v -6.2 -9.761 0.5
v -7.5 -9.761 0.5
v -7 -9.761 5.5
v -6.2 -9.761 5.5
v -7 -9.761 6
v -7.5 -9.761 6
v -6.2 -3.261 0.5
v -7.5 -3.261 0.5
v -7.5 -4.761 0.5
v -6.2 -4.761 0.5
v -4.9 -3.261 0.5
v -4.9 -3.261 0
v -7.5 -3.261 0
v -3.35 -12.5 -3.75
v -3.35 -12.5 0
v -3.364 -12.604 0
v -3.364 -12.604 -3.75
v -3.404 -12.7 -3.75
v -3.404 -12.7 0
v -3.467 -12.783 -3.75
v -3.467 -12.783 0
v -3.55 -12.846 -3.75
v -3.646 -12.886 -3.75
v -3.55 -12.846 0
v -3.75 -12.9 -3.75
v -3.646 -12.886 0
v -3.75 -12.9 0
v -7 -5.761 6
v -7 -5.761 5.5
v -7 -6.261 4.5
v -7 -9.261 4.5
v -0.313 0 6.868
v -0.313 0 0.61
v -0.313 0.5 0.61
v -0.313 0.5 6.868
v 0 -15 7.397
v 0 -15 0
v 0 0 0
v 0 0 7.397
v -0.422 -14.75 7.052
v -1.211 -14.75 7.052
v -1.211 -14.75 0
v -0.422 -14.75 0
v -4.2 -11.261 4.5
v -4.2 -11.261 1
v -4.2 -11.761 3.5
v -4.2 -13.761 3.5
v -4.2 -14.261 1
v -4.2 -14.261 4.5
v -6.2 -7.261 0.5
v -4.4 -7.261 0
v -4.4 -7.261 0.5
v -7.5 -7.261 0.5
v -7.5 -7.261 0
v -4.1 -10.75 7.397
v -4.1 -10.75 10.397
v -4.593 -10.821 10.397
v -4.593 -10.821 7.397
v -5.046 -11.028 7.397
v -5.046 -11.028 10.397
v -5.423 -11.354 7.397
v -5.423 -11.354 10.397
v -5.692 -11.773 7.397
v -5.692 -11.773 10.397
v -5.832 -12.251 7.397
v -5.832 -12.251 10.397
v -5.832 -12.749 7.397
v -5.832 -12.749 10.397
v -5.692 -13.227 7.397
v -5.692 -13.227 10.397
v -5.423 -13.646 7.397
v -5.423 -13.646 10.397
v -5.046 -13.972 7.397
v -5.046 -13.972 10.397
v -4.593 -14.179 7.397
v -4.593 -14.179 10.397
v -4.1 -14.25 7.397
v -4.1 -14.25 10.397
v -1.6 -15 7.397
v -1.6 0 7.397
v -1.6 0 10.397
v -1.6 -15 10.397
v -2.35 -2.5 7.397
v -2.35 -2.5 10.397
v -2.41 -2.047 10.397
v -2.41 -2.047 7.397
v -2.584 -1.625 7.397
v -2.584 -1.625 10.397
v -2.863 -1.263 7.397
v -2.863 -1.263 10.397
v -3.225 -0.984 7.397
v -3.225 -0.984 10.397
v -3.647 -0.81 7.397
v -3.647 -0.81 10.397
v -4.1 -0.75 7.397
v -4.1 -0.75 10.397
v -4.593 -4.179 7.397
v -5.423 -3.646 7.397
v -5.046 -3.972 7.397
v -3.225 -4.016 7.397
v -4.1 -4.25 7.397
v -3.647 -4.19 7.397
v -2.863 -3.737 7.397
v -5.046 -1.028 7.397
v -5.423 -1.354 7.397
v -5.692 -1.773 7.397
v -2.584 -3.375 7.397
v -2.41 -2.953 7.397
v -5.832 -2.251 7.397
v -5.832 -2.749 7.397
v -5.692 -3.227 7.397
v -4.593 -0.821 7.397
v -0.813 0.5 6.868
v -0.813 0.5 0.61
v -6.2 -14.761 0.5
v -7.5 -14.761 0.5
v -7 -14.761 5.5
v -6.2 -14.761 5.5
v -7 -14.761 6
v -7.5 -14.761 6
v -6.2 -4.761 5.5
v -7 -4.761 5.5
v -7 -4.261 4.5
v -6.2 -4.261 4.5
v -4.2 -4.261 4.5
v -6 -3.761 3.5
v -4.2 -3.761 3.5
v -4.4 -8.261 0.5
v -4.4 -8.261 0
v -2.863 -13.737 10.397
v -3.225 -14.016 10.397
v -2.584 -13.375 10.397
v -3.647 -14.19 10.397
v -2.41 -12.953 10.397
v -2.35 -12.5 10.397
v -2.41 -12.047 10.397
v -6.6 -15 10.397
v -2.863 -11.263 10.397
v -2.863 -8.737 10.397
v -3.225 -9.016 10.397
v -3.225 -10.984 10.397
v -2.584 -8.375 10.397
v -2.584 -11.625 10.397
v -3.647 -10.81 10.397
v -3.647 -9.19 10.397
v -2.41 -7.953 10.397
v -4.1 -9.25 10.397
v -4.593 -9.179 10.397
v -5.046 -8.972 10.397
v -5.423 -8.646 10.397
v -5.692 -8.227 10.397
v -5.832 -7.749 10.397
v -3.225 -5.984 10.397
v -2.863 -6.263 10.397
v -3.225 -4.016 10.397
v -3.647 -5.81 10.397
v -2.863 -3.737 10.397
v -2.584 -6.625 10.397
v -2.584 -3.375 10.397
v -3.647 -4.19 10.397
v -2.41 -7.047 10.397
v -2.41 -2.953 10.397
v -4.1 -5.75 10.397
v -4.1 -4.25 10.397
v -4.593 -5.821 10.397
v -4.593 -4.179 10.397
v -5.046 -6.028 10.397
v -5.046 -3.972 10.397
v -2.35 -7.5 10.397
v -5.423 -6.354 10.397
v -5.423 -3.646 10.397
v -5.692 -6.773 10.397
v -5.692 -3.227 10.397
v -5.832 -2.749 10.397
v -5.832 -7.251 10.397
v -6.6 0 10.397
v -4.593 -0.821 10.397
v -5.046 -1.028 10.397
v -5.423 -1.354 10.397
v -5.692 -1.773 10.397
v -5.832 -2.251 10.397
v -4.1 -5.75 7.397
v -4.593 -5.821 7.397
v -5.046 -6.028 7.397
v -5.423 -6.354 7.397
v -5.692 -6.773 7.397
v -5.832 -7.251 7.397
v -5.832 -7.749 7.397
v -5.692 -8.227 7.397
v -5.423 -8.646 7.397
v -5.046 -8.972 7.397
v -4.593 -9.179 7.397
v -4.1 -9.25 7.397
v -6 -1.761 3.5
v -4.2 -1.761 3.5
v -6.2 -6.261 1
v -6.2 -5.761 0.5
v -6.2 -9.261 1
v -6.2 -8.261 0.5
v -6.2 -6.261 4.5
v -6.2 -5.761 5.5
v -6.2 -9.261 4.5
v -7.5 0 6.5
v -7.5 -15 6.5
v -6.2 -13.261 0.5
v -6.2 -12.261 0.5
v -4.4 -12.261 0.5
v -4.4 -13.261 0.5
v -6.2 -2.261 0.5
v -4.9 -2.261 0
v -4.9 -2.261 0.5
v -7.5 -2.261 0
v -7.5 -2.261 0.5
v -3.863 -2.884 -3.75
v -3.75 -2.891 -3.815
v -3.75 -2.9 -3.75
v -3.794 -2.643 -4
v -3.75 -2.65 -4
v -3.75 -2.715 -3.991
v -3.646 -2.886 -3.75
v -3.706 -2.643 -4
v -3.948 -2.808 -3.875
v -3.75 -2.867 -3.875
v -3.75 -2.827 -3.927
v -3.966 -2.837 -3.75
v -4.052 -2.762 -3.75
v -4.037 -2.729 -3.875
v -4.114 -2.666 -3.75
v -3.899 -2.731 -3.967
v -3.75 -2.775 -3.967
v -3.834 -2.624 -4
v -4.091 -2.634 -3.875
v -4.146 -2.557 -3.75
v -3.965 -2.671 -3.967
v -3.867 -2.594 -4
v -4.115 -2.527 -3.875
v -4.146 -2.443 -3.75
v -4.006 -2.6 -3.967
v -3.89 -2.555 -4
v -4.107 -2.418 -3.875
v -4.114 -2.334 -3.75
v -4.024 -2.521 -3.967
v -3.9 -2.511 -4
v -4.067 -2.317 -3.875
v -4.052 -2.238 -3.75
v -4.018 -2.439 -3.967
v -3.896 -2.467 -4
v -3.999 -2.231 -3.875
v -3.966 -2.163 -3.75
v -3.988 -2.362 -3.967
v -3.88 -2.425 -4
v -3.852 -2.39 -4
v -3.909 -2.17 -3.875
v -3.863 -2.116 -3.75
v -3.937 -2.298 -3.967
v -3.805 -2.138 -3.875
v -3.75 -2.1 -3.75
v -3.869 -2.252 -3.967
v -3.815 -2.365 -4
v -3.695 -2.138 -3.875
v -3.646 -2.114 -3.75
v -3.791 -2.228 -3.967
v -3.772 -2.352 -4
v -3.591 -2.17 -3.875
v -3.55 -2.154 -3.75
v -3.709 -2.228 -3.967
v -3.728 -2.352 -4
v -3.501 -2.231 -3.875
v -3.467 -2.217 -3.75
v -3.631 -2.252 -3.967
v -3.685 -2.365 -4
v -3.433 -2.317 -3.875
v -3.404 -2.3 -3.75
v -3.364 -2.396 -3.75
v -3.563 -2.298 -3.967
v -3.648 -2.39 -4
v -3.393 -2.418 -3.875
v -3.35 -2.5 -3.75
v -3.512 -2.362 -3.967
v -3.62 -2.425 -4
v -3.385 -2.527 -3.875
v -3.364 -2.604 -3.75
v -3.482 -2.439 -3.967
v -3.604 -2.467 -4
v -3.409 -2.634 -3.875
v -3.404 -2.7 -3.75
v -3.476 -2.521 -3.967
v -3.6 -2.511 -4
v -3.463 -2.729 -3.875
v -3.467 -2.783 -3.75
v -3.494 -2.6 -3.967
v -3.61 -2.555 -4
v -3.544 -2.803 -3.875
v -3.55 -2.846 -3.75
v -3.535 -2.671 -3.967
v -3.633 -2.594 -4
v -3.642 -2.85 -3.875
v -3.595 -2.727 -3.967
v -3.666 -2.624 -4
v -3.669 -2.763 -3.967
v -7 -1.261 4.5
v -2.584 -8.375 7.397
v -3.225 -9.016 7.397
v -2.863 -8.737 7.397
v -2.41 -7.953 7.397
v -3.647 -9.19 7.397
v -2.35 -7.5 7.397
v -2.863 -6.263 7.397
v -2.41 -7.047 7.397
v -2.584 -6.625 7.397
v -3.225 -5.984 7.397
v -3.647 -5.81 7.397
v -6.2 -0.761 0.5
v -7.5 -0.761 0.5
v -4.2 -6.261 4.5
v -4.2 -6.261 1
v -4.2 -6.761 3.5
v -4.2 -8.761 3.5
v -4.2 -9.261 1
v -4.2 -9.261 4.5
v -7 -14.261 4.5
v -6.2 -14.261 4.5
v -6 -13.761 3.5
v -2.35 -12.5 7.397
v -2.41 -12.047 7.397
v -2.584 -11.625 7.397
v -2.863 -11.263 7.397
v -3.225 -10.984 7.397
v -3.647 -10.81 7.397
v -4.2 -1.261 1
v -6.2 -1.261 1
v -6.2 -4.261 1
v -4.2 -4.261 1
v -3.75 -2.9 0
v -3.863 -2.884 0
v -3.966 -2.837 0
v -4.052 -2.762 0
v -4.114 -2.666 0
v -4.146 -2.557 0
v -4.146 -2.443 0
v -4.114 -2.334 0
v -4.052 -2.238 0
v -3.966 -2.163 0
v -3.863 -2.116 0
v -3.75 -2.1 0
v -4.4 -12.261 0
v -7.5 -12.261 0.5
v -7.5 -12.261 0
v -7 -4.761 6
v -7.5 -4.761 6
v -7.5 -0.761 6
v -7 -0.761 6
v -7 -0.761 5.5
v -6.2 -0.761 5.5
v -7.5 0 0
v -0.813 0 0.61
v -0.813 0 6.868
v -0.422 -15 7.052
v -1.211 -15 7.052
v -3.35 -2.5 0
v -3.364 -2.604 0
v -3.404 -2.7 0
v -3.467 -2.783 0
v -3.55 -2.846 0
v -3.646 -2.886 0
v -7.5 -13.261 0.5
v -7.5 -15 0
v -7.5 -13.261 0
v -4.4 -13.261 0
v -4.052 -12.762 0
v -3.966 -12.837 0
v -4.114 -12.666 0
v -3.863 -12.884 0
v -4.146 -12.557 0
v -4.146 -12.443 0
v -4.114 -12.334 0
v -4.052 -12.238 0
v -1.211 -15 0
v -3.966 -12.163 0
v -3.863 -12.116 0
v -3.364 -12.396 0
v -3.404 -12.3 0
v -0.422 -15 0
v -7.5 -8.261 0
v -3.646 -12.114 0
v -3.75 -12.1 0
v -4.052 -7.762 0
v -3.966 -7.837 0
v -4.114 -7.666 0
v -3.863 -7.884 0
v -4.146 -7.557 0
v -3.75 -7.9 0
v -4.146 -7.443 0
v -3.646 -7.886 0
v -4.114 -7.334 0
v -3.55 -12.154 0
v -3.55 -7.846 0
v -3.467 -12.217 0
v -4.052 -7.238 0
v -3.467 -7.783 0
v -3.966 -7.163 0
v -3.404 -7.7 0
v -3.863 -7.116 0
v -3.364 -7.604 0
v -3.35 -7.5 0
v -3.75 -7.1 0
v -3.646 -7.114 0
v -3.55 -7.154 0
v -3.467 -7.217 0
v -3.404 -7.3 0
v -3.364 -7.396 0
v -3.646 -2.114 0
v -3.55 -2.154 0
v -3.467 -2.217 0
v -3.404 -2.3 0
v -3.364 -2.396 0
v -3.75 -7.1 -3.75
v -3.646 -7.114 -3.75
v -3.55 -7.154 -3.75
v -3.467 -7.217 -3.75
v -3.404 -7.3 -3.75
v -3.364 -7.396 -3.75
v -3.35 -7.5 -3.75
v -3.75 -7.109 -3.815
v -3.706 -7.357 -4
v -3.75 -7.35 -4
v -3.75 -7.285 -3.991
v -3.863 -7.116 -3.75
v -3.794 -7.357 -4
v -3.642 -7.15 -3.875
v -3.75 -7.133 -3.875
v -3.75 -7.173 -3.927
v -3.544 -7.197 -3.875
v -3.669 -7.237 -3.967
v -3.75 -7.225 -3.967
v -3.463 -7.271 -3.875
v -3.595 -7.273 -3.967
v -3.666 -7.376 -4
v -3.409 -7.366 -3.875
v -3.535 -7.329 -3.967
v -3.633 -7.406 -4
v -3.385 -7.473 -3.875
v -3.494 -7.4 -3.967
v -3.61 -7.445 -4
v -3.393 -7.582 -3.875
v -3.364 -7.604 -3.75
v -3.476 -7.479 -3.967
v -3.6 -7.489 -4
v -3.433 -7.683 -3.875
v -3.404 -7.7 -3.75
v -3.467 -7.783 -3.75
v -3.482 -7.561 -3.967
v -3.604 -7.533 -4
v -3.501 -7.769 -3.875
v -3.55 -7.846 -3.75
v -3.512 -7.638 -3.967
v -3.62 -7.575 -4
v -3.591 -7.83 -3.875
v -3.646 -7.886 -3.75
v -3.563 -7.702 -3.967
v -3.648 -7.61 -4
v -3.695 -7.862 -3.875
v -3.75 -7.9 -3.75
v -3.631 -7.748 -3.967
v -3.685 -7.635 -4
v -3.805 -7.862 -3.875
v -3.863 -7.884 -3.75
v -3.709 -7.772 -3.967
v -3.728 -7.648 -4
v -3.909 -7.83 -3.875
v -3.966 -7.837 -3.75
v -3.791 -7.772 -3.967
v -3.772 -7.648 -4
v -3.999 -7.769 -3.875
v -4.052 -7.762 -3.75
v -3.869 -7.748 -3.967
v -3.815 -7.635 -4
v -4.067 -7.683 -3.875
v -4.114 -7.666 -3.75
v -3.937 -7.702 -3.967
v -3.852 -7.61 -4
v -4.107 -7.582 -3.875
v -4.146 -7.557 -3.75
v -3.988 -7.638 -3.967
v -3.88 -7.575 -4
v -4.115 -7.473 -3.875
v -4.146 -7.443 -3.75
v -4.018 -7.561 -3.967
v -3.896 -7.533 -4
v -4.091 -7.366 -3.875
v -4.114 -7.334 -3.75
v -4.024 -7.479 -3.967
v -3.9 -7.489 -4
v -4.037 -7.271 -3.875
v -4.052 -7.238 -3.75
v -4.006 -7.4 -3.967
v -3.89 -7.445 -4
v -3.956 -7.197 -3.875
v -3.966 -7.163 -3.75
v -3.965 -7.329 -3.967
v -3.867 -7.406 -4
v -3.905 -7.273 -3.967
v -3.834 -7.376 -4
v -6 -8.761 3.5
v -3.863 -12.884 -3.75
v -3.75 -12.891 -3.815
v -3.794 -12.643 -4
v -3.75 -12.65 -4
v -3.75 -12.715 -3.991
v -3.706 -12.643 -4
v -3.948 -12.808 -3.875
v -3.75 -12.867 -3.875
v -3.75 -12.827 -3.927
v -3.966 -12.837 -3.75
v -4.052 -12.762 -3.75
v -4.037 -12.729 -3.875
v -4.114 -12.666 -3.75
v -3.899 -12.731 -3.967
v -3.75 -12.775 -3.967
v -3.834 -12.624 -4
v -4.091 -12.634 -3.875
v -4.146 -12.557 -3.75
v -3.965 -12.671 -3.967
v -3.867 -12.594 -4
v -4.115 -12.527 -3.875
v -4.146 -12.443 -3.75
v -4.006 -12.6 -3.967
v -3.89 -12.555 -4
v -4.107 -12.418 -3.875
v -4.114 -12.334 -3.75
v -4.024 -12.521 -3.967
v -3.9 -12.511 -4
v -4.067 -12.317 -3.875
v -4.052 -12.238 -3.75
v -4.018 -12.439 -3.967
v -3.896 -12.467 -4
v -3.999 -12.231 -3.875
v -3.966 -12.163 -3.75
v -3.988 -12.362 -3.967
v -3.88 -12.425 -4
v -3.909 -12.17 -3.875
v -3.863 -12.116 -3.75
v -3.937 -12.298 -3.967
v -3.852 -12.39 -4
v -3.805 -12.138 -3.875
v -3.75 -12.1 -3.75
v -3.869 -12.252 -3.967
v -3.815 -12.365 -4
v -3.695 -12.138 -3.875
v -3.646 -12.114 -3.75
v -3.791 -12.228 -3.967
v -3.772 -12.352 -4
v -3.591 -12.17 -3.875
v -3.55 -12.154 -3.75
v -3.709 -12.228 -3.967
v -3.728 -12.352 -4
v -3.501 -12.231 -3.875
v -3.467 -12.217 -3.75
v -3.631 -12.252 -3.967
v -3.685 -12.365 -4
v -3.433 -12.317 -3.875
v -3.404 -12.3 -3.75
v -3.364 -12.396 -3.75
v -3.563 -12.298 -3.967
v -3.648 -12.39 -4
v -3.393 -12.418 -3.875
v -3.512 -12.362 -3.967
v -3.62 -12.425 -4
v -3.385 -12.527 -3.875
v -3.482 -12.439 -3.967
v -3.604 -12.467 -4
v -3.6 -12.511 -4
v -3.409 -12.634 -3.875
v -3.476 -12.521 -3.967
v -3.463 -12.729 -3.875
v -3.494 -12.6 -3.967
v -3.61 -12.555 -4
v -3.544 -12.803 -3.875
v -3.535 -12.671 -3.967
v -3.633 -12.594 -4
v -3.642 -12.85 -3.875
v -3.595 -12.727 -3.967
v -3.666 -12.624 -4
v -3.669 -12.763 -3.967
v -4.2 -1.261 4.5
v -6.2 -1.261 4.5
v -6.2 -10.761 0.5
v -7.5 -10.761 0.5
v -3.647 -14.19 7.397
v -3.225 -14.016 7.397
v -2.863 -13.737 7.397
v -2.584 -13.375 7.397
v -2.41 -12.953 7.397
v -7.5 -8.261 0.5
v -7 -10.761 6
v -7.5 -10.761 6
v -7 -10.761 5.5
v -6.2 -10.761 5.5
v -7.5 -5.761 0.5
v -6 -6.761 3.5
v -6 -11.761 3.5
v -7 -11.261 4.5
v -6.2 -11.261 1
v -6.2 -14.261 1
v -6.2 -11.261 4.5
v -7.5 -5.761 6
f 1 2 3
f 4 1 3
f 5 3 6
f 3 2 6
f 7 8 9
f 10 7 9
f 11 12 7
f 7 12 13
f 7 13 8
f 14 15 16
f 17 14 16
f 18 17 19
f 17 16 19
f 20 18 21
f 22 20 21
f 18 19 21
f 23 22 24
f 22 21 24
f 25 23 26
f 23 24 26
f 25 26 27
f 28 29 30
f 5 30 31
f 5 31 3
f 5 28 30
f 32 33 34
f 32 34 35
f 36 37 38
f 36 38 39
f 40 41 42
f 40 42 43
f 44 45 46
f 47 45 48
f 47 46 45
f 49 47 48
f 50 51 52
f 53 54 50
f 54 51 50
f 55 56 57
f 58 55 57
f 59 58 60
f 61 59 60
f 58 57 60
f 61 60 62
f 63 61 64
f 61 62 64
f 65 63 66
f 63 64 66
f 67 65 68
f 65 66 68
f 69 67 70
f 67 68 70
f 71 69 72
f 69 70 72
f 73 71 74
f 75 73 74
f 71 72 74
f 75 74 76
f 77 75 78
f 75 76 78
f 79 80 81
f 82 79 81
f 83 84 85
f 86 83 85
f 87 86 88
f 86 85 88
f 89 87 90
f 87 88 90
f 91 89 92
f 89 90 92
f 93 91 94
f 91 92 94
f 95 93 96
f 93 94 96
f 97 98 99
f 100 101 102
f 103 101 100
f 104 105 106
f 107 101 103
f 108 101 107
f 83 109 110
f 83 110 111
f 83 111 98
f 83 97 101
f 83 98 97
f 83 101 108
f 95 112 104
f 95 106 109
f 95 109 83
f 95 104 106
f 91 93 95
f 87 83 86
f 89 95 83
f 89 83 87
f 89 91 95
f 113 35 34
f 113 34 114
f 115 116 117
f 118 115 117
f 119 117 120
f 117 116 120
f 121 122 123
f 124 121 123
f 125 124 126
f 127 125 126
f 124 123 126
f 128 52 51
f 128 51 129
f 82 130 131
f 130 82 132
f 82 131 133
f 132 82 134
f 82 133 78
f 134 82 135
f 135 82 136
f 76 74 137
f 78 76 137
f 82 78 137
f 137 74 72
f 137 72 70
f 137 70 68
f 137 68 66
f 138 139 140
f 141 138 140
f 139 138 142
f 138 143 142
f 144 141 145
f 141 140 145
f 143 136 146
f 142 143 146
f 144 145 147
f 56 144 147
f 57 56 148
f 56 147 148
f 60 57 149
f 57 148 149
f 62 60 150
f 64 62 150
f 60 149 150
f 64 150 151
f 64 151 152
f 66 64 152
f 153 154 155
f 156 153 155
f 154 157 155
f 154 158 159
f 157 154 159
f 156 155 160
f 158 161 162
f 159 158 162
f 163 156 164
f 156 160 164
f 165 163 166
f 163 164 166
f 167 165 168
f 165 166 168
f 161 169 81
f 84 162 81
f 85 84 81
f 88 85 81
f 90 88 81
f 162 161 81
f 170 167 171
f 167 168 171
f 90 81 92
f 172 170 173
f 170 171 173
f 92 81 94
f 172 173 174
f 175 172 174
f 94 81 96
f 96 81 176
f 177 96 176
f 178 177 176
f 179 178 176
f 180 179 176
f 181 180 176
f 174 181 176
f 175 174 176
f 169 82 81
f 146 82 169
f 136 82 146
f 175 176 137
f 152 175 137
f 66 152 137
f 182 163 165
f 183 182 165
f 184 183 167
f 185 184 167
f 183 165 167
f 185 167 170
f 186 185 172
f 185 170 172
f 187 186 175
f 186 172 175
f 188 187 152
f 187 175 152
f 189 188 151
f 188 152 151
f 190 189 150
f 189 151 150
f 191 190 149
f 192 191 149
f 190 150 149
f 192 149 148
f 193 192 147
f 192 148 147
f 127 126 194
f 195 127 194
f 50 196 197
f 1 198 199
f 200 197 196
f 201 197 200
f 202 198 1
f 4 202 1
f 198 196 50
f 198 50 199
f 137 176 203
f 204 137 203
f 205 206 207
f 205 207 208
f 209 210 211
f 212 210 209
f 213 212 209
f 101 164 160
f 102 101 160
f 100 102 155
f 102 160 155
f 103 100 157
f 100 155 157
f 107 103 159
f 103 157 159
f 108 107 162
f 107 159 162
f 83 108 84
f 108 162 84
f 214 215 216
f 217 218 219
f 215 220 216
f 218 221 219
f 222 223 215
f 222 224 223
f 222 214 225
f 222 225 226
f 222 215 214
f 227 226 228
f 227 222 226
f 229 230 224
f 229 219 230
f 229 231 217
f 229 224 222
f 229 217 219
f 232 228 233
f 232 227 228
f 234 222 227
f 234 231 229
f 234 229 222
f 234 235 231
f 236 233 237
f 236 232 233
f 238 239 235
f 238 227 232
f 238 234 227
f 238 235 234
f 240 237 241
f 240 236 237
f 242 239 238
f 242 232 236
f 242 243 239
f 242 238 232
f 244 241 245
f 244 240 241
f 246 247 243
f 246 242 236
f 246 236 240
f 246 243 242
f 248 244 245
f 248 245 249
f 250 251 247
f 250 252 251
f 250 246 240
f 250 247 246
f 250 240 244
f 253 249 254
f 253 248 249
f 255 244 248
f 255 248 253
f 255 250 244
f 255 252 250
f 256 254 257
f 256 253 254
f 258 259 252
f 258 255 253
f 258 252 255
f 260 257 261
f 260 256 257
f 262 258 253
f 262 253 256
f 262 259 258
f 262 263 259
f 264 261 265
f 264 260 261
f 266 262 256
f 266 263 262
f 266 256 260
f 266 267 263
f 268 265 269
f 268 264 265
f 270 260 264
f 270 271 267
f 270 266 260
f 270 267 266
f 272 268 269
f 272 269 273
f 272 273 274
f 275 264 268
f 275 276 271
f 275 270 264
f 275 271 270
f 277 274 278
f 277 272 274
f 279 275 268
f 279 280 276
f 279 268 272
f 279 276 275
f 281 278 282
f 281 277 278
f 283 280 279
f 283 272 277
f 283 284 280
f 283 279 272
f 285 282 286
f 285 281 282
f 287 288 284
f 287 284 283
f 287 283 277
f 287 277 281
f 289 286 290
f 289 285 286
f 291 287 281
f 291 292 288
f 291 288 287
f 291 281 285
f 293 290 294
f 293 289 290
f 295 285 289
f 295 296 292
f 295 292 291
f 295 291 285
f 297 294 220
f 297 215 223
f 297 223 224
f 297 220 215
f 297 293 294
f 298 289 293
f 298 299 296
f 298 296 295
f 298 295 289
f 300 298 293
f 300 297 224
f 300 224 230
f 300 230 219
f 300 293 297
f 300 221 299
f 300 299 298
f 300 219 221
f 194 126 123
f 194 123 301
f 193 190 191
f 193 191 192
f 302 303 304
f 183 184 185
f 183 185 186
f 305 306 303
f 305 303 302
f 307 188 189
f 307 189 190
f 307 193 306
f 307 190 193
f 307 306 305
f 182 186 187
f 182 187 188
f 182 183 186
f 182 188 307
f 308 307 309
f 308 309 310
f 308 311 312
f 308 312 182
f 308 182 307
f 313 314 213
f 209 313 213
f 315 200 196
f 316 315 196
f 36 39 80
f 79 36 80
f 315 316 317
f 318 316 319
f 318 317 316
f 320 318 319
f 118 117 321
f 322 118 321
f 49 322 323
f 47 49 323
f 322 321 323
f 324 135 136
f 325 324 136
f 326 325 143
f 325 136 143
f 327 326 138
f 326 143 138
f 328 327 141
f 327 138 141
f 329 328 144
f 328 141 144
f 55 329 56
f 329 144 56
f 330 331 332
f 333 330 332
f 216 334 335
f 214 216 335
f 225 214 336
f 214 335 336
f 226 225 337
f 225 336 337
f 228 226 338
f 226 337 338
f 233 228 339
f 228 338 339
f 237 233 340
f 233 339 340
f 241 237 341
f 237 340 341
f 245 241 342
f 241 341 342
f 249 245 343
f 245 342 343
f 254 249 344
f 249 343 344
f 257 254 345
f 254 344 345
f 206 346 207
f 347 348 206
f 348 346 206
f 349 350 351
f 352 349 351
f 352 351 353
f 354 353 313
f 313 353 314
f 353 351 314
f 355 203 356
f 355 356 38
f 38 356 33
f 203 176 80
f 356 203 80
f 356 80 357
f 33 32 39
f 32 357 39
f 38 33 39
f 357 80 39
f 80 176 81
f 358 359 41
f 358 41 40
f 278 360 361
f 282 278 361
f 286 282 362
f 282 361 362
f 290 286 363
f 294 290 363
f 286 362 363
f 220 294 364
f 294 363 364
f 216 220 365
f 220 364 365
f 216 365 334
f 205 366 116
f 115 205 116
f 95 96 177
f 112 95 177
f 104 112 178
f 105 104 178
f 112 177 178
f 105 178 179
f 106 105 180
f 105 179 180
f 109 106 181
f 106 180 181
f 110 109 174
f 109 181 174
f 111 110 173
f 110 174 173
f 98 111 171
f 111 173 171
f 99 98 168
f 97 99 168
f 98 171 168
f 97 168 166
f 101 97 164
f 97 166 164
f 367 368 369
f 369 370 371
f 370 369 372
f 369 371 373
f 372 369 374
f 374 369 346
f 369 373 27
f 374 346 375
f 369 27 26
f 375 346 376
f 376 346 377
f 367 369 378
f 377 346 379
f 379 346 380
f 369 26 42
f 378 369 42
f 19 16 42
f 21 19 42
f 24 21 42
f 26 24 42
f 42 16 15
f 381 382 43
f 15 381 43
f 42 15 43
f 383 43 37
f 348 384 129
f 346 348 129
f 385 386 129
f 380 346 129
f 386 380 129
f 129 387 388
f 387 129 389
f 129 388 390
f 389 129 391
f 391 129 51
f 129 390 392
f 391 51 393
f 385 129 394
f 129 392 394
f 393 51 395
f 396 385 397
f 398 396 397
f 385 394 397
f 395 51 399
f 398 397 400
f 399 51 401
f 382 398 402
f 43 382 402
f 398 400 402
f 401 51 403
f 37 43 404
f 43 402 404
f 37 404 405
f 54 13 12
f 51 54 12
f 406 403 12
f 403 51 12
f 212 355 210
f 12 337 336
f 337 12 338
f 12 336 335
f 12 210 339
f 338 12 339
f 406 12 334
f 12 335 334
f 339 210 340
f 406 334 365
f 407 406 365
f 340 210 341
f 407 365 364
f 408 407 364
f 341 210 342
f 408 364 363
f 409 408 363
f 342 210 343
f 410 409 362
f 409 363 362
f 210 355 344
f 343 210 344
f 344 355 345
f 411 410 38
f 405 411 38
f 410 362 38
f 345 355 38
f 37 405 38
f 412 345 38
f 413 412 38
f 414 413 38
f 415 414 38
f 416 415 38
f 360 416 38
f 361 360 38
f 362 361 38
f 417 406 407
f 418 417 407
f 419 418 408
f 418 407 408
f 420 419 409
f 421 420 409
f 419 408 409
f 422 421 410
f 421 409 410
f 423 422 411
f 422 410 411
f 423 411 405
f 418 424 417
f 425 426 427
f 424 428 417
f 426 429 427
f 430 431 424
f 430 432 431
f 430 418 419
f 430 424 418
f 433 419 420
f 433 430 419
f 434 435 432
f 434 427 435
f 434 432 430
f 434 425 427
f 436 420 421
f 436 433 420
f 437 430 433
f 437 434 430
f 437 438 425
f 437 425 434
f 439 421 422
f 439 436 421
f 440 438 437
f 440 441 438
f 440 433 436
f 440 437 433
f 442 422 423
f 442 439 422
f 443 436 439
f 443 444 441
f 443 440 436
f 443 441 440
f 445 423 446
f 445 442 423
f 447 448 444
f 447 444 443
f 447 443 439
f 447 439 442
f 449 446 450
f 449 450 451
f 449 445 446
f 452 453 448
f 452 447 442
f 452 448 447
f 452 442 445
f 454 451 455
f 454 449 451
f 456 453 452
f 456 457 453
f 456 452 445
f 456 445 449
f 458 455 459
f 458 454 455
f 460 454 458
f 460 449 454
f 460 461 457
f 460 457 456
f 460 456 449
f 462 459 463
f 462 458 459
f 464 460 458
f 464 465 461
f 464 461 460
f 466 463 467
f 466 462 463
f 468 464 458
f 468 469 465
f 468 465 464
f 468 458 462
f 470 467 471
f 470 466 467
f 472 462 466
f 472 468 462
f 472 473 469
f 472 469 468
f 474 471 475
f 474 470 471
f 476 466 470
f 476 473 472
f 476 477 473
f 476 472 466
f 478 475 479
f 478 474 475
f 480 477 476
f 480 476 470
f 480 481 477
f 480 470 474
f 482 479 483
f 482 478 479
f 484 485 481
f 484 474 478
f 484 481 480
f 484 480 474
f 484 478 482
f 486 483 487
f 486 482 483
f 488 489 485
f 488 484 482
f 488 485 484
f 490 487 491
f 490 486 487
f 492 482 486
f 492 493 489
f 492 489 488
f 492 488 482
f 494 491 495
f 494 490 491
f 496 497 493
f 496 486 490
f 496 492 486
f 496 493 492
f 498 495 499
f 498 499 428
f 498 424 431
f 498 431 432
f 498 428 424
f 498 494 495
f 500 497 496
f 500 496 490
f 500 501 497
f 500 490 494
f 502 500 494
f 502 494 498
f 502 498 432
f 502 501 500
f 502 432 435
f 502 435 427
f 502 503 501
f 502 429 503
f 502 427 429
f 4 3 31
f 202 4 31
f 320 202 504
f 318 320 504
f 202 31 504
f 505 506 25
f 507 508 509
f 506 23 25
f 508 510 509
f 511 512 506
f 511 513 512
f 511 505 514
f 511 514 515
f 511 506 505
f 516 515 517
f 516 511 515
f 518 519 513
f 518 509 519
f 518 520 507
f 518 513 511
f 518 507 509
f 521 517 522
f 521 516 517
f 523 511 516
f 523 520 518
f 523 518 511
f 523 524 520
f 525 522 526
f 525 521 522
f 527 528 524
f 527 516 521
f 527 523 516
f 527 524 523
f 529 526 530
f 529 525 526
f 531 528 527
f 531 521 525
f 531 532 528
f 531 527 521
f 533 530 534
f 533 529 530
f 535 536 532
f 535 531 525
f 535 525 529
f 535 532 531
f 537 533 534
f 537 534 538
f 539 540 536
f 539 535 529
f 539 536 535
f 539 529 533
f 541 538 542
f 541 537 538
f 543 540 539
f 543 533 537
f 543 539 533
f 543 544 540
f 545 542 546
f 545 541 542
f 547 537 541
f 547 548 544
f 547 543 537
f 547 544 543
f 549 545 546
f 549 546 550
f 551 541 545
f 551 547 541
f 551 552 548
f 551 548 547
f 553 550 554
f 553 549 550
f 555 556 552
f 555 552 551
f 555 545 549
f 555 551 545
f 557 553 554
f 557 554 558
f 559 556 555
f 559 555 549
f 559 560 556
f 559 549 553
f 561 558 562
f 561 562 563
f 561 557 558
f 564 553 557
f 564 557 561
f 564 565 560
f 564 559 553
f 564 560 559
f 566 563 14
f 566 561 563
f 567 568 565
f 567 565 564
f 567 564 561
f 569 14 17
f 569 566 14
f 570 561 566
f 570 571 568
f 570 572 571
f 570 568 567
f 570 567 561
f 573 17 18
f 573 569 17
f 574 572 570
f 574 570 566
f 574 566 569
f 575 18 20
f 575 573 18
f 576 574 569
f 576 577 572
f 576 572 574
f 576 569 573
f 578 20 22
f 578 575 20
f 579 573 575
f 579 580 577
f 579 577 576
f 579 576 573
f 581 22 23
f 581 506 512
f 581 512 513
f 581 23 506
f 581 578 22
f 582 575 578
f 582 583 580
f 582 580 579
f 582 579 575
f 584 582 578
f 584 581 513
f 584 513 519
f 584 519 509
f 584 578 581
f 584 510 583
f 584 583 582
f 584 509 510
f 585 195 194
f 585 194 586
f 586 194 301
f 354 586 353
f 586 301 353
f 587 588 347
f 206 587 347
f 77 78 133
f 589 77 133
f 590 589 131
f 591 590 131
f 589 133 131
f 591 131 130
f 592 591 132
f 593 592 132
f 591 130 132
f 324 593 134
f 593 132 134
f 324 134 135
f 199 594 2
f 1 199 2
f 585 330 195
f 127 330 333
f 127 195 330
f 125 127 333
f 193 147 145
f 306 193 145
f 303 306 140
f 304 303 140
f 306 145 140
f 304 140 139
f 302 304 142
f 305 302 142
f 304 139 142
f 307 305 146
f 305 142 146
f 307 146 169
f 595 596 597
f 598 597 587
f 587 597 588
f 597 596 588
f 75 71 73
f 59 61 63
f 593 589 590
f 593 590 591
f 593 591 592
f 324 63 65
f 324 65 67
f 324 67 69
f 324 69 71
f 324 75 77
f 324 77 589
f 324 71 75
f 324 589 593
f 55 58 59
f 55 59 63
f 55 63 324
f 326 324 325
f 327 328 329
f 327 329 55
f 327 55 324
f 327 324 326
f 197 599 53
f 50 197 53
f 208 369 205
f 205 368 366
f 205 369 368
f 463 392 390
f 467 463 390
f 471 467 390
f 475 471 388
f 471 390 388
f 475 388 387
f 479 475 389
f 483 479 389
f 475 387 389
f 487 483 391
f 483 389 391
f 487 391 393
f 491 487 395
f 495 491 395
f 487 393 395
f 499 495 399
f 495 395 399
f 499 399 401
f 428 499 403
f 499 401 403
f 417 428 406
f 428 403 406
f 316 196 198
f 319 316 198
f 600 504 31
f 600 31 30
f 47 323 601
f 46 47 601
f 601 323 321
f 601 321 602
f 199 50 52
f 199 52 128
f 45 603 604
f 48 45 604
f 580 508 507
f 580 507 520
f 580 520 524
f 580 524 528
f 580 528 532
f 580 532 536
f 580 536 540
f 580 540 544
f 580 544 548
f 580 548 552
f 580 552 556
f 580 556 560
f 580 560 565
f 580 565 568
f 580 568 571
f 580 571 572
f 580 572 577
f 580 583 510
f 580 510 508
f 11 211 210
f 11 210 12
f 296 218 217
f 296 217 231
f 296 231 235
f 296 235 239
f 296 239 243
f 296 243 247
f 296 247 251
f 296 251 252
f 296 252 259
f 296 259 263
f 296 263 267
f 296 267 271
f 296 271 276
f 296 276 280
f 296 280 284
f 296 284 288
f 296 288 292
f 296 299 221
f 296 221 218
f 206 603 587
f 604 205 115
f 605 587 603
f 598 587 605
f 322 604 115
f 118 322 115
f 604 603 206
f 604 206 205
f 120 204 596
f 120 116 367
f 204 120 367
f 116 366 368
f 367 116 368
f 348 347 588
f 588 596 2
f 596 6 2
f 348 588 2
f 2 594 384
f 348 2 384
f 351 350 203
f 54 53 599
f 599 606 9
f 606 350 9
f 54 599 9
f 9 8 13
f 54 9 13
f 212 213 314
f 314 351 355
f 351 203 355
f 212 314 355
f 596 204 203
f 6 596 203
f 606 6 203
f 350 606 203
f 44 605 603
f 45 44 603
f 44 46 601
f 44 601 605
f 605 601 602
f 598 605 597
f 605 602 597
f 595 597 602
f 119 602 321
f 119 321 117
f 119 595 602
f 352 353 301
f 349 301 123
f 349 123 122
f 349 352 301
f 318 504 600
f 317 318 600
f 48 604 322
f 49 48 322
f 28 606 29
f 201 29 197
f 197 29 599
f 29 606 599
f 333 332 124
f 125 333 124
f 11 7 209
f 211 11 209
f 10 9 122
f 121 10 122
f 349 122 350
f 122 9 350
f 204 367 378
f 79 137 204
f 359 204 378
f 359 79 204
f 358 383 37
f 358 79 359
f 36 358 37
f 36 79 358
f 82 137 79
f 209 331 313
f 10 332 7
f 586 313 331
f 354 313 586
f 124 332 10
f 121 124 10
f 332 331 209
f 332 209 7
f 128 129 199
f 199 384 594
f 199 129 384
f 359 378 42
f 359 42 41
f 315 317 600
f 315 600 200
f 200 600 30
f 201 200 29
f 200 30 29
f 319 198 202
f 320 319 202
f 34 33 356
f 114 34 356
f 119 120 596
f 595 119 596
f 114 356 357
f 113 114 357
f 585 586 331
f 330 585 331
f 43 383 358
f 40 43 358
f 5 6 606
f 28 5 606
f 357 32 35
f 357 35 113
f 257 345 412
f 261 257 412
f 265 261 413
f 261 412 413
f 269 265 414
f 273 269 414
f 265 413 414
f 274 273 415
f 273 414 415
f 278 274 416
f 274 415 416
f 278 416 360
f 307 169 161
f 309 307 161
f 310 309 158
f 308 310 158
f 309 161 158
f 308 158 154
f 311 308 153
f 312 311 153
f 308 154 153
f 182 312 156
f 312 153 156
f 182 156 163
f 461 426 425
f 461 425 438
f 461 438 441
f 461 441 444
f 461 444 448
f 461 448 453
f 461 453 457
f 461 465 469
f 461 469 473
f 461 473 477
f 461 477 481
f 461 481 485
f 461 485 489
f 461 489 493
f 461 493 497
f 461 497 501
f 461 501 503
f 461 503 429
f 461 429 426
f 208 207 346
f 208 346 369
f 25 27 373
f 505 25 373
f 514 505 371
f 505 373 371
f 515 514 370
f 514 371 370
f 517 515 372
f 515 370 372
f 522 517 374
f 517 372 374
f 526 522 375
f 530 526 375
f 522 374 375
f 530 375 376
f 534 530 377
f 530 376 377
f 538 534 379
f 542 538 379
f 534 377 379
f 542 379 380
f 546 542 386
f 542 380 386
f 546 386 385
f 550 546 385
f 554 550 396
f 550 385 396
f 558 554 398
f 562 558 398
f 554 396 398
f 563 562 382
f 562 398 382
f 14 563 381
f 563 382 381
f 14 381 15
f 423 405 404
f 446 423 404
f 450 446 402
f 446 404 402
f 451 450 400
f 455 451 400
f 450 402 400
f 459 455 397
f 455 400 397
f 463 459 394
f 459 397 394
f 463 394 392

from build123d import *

# Parameters (mm, degrees)
F1_DEPTH  = 15
F3_DEPTH  = 3
F4_W      = 0.5
F4_H      = 0.5
F5_DEPTH  = 0.5
F6_DEPTH  = 1.3
F7_DEPTH  = 3.3
F8_SIZE   = 1
F9_W      = 0.7894294686
F9_H      = 7.0516658016
F10_DEPTH = 0.25
F11_W     = 0.5
F11_H     = 6.2580032973
F12_DEPTH = 0.5
F14_DEPTH = 4
F6_FACE_W = 1
F6_FACE_H = 0.5
F16_DEPTH = 2.6


# Not quite as in the source:
# - a fillet or chamfer that OpenCascade refuses, or shapes differently, is made with other operations: its cross-section is extruded or revolved along the edge and cut away or added


with BuildPart() as f1:
    # F0 (on Front) → F1 (new body)
    with BuildSketch(Plane.XZ):
        Polygon((-7.5, 0), (0, 0), (0, 7.397435054), (-1.6, 7.397435054), (-1.6, 10.397435054), (-6.6, 10.397435054), (-7.5, 6.5), align=None)
    extrude(amount=F1_DEPTH)

    # F2 (on face) → F3 (cut)
    with BuildSketch(Plane.XY.offset(10.397435054)):
        with BuildLine():
            ThreePointArc((-2.35, -2.5), (-2.8625631329, -1.2625631329), (-4.1, -0.75))
            Line((-4.1, -0.75), (-4.1, -2.5))
            Line((-4.1, -2.5), (-4.1, -4.25))
            ThreePointArc((-4.1, -4.25), (-2.8625631329, -3.7374368671), (-2.35, -2.5))
        make_face()
        with BuildLine():
            ThreePointArc((-2.35, -12.5), (-2.8625631329, -11.2625631329), (-4.1, -10.75))
            Line((-4.1, -10.75), (-4.1, -14.25))
            ThreePointArc((-4.1, -14.25), (-2.8625631329, -13.7374368671), (-2.35, -12.5))
        make_face()
        with BuildLine():
            Line((-4.1, -14.25), (-4.1, -10.75))
            ThreePointArc((-4.1, -10.75), (-5.85, -12.5), (-4.1, -14.25))
        make_face()
        with BuildLine():
            ThreePointArc((-2.35, -7.5), (-2.8625631329, -6.2625631329), (-4.1, -5.75))
            Line((-4.1, -5.75), (-4.1, -7.5))
            Line((-4.1, -7.5), (-2.35, -7.5))
        make_face()
        with BuildLine():
            Line((-4.1, -7.5), (-4.1, -5.75))
            ThreePointArc((-4.1, -5.75), (-5.85, -7.5), (-4.1, -9.25))
            Line((-4.1, -9.25), (-4.1, -7.5))
        make_face()
        with BuildLine():
            Line((-4.1, -2.5), (-4.1, -0.75))
            ThreePointArc((-4.1, -0.75), (-5.85, -2.5), (-4.1, -4.25))
            Line((-4.1, -4.25), (-4.1, -2.5))
        make_face()
        with BuildLine():
            Line((-2.35, -7.5), (-4.1, -7.5))
            Line((-4.1, -7.5), (-4.1, -9.25))
            ThreePointArc((-4.1, -9.25), (-2.8625631329, -8.7374368671), (-2.35, -7.5))
        make_face()
    extrude(amount=-F3_DEPTH, mode=Mode.SUBTRACT)

    # F4 (on face) → F5 (cut)
    with BuildSketch(Plane(origin=(-7.5, 0, 0), x_dir=(0, -1, 0), z_dir=(-1, 0, 0))):
        with Locations((2.510879118, 0.25)):
            Rectangle(F4_W, F4_H)
        with Locations((12.510879118, 0.25)):
            Rectangle(F4_W, F4_H)
        with Locations((7.510879118, 0.25)):
            Rectangle(F4_W, F4_H)
        with Locations((3.010879118, 0.25)):
            Rectangle(F4_W, F4_H)
        Polygon((0.760879118, 0.5), (2.260879118, 0.5), (2.760879118, 0.5), (2.760879118, 1), (1.260879118, 1), (1.260879118, 4.5), (0.760879118, 5.5), align=None)
        Polygon((2.760879118, 1), (2.760879118, 0.5), (3.260879118, 0.5), (4.760879118, 0.5), (4.760879118, 5.5), (4.260879118, 4.5), (4.260879118, 1), align=None)
        Polygon((0.760879118, 6), (0.760879118, 5.5), (1.260879118, 4.5), (1.760879118, 3.5), (2.760879118, 3.5), (2.760879118, 5.5), (2.760879118, 6), align=None)
        with Locations((8.010879118, 0.25)):
            Rectangle(F4_W, F4_H)
        Polygon((5.760879118, 0.5), (7.260879118, 0.5), (7.760879118, 0.5), (7.760879118, 1), (6.260879118, 1), (6.260879118, 4.5), (5.760879118, 5.5), align=None)
        Polygon((2.760879118, 5.5), (2.760879118, 3.5), (3.760879118, 3.5), (4.260879118, 4.5), (4.760879118, 5.5), (4.760879118, 6), (2.760879118, 6), align=None)
        Polygon((7.760879118, 1), (7.760879118, 0.5), (8.260879118, 0.5), (9.760879118, 0.5), (9.760879118, 5.5), (9.260879118, 4.5), (9.260879118, 1), align=None)
        Polygon((5.760879118, 6), (5.760879118, 5.5), (6.260879118, 4.5), (6.760879118, 3.5), (7.760879118, 3.5), (7.760879118, 5.5), (7.760879118, 6), align=None)
        with Locations((13.010879118, 0.25)):
            Rectangle(F4_W, F4_H)
        Polygon((10.760879118, 0.5), (12.260879118, 0.5), (12.760879118, 0.5), (12.760879118, 1), (11.260879118, 1), (11.260879118, 4.5), (10.760879118, 5.5), align=None)
        Polygon((7.760879118, 5.5), (7.760879118, 3.5), (8.760879118, 3.5), (9.260879118, 4.5), (9.760879118, 5.5), (9.760879118, 6), (7.760879118, 6), align=None)
        Polygon((12.760879118, 1), (12.760879118, 0.5), (13.260879118, 0.5), (14.760879118, 0.5), (14.760879118, 5.5), (14.260879118, 4.5), (14.260879118, 1), align=None)
        Polygon((10.760879118, 6), (10.760879118, 5.5), (11.260879118, 4.5), (11.760879118, 3.5), (12.760879118, 3.5), (12.760879118, 5.5), (12.760879118, 6), align=None)
        Polygon((12.760879118, 5.5), (12.760879118, 3.5), (13.760879118, 3.5), (14.260879118, 4.5), (14.760879118, 5.5), (14.760879118, 6), (12.760879118, 6), align=None)
        Polygon((1.260879118, 1), (2.760879118, 1), (2.760879118, 3.5), (1.760879118, 3.5), (1.260879118, 4.5), align=None)
        Polygon((2.760879118, 3.5), (2.760879118, 1), (4.260879118, 1), (4.260879118, 4.5), (3.760879118, 3.5), align=None)
        Polygon((6.260879118, 1), (7.760879118, 1), (7.760879118, 3.5), (6.760879118, 3.5), (6.260879118, 4.5), align=None)
        Polygon((7.760879118, 3.5), (7.760879118, 1), (9.260879118, 1), (9.260879118, 4.5), (8.760879118, 3.5), align=None)
        Polygon((11.260879118, 1), (12.760879118, 1), (12.760879118, 3.5), (11.760879118, 3.5), (11.260879118, 4.5), align=None)
        Polygon((12.760879118, 3.5), (12.760879118, 1), (14.260879118, 1), (14.260879118, 4.5), (13.760879118, 3.5), align=None)
    extrude(amount=-F5_DEPTH, mode=Mode.SUBTRACT)

    # F4 (on face) → F6 (cut)
    with BuildSketch(Plane(origin=(-7.5, 0, 0), x_dir=(0, -1, 0), z_dir=(-1, 0, 0))):
        Polygon((0.760879118, 0.5), (2.260879118, 0.5), (2.760879118, 0.5), (2.760879118, 1), (1.260879118, 1), (1.260879118, 4.5), (0.760879118, 5.5), align=None)
        Polygon((1.260879118, 1), (2.760879118, 1), (2.760879118, 3.5), (1.760879118, 3.5), (1.260879118, 4.5), align=None)
        Polygon((2.760879118, 3.5), (2.760879118, 1), (4.260879118, 1), (4.260879118, 4.5), (3.760879118, 3.5), align=None)
        Polygon((2.760879118, 1), (2.760879118, 0.5), (3.260879118, 0.5), (4.760879118, 0.5), (4.760879118, 5.5), (4.260879118, 4.5), (4.260879118, 1), align=None)
        Polygon((5.760879118, 0.5), (7.260879118, 0.5), (7.760879118, 0.5), (7.760879118, 1), (6.260879118, 1), (6.260879118, 4.5), (5.760879118, 5.5), align=None)
        Polygon((6.260879118, 1), (7.760879118, 1), (7.760879118, 3.5), (6.760879118, 3.5), (6.260879118, 4.5), align=None)
        Polygon((7.760879118, 3.5), (7.760879118, 1), (9.260879118, 1), (9.260879118, 4.5), (8.760879118, 3.5), align=None)
        Polygon((7.760879118, 1), (7.760879118, 0.5), (8.260879118, 0.5), (9.760879118, 0.5), (9.760879118, 5.5), (9.260879118, 4.5), (9.260879118, 1), align=None)
        Polygon((12.260879118, 0.5), (12.760879118, 0.5), (12.760879118, 1), (11.260879118, 1), (11.260879118, 4.5), (10.760879118, 5.5), (10.760879118, 0.5), align=None)
        Polygon((11.260879118, 1), (12.760879118, 1), (12.760879118, 3.5), (11.760879118, 3.5), (11.260879118, 4.5), align=None)
        Polygon((12.760879118, 3.5), (12.760879118, 1), (14.260879118, 1), (14.260879118, 4.5), (13.760879118, 3.5), align=None)
        Polygon((12.760879118, 0.5), (13.260879118, 0.5), (14.760879118, 0.5), (14.760879118, 5.5), (14.260879118, 4.5), (14.260879118, 1), (12.760879118, 1), align=None)
    extrude(amount=-F6_DEPTH, mode=Mode.SUBTRACT)

    # F4 (on face) → F7 (cut)
    with BuildSketch(Plane(origin=(-7.5, 0, 0), x_dir=(0, -1, 0), z_dir=(-1, 0, 0))):
        Polygon((1.260879118, 1), (2.760879118, 1), (2.760879118, 3.5), (1.760879118, 3.5), (1.260879118, 4.5), align=None)
        Polygon((2.760879118, 3.5), (2.760879118, 1), (4.260879118, 1), (4.260879118, 4.5), (3.760879118, 3.5), align=None)
        Polygon((6.260879118, 1), (7.760879118, 1), (7.760879118, 3.5), (6.760879118, 3.5), (6.260879118, 4.5), align=None)
        Polygon((7.760879118, 3.5), (7.760879118, 1), (9.260879118, 1), (9.260879118, 4.5), (8.760879118, 3.5), align=None)
        Polygon((11.260879118, 1), (12.760879118, 1), (12.760879118, 3.5), (11.760879118, 3.5), (11.260879118, 4.5), align=None)
        Polygon((12.760879118, 3.5), (12.760879118, 1), (14.260879118, 1), (14.260879118, 4.5), (13.760879118, 3.5), align=None)
    extrude(amount=-F7_DEPTH, mode=Mode.SUBTRACT)

    # F8
    f8_edges = [f1.edges().sort_by_distance(p)[0] for p in [
        (-7, -2.760879, 3.5),
        (-7, -7.760879, 3.5),
        (-7, -12.760879, 3.5),
    ]]
    chamfer(f8_edges, length=F8_SIZE)

    # F9 (on face) → F10 (cut)
    with BuildSketch(Plane.XZ.offset(15)):
        with Locations((-0.816616026, 3.5258329008)):
            Rectangle(F9_W, F9_H)
    extrude(amount=-F10_DEPTH, mode=Mode.SUBTRACT)

    # F11 (on face) → F12 (join)
    with BuildSketch(Plane(origin=(0, 0, 0), x_dir=(-1, 0, 0), z_dir=(0, 1, 0))):
        with Locations((0.5626286319, 3.7392643862)):
            Rectangle(F11_W, F11_H)
    extrude(amount=F12_DEPTH)

    # F13 (on face) → F14 (join)
    with BuildSketch(Plane(origin=(0, 0, 0), x_dir=(1, 0, 0), z_dir=(0, 0, -1))):
        with BuildLine():
            ThreePointArc((-3.35, 12.5), (-3.4671572875, 12.7828427125), (-3.75, 12.9))
            Line((-3.75, 12.9), (-3.75, 12.5))
            Line((-3.75, 12.5), (-3.75, 12.1))
            ThreePointArc((-3.75, 12.1), (-3.4671572875, 12.2171572875), (-3.35, 12.5))
        make_face()
        with BuildLine():
            ThreePointArc((-3.35, 2.5), (-3.4671572875, 2.7828427125), (-3.75, 2.9))
            Line((-3.75, 2.9), (-3.75, 2.1))
            ThreePointArc((-3.75, 2.1), (-3.4671572875, 2.2171572875), (-3.35, 2.5))
        make_face()
        with BuildLine():
            Line((-3.75, 2.1), (-3.75, 2.9))
            ThreePointArc((-3.75, 2.9), (-4.15, 2.5), (-3.75, 2.1))
        make_face()
        with BuildLine():
            ThreePointArc((-3.35, 7.5), (-3.4671572875, 7.7828427125), (-3.75, 7.9))
            Line((-3.75, 7.9), (-3.75, 7.5))
            Line((-3.75, 7.5), (-3.35, 7.5))
        make_face()
        with BuildLine():
            Line((-3.75, 7.5), (-3.75, 7.9))
            ThreePointArc((-3.75, 7.9), (-4.15, 7.5), (-3.75, 7.1))
            Line((-3.75, 7.1), (-3.75, 7.5))
        make_face()
        with BuildLine():
            Line((-3.75, 12.5), (-3.75, 12.9))
            ThreePointArc((-3.75, 12.9), (-4.15, 12.5), (-3.75, 12.1))
            Line((-3.75, 12.1), (-3.75, 12.5))
        make_face()
        with BuildLine():
            Line((-3.35, 7.5), (-3.75, 7.5))
            Line((-3.75, 7.5), (-3.75, 7.1))
            ThreePointArc((-3.75, 7.1), (-3.4671572875, 7.2171572875), (-3.35, 7.5))
        make_face()
    extrude(amount=F14_DEPTH)

    # F15: fillet of radius 0.25 on 3 edges, made by hand

    # F15_s1 → F15_t2 (revolve, cut)
    with BuildSketch(Plane.YZ.offset(-3.75)):
        with BuildLine():
            ThreePointArc((-12.9, -3.75), (-12.8267766953, -3.9267766953), (-12.65, -4))
            Line((-12.65, -4), (-12.9, -4))
            Line((-12.9, -4), (-12.9, -3.75))
        make_face()
    revolve(axis=Axis((-3.75, -12.5, -4), (0, 0, -1)), mode=Mode.SUBTRACT)

    # F15_s3 → F15_t4 (revolve, cut)
    with BuildSketch(Plane.YZ.offset(-3.75)):
        with BuildLine():
            ThreePointArc((-7.1, -3.75), (-7.1732233047, -3.9267766953), (-7.35, -4))
            Line((-7.35, -4), (-7.1, -4))
            Line((-7.1, -4), (-7.1, -3.75))
        make_face()
    revolve(axis=Axis((-3.75, -7.5, -4), (0, 0, -1)), mode=Mode.SUBTRACT)

    # F15_s5 → F15_t6 (revolve, cut)
    with BuildSketch(Plane.YZ.offset(-3.75)):
        with BuildLine():
            ThreePointArc((-2.9, -3.75), (-2.8267766953, -3.9267766953), (-2.65, -4))
            Line((-2.65, -4), (-2.9, -4))
            Line((-2.9, -4), (-2.9, -3.75))
        make_face()
    revolve(axis=Axis((-3.75, -2.5, -4), (0, 0, -1)), mode=Mode.SUBTRACT)

    # F6_face (on face) + F4 (on face) → F16 (cut)
    with BuildSketch(Plane(origin=(-7, -12.760879118, 0.25), x_dir=(0, -1, 0), z_dir=(-1, 0, 0))):
        Rectangle(F6_FACE_W, F6_FACE_H)
        with Locations((-5, 0)):
            Rectangle(F6_FACE_W, F6_FACE_H)
    with BuildSketch(Plane(origin=(-7.5, 0, 0), x_dir=(0, -1, 0), z_dir=(-1, 0, 0))):
        with Locations((3.010879118, 0.25)):
            Rectangle(F4_W, F4_H)
        with Locations((2.510879118, 0.25)):
            Rectangle(F4_W, F4_H)
    extrude(amount=-F16_DEPTH, mode=Mode.SUBTRACT)


solid = f1.part
